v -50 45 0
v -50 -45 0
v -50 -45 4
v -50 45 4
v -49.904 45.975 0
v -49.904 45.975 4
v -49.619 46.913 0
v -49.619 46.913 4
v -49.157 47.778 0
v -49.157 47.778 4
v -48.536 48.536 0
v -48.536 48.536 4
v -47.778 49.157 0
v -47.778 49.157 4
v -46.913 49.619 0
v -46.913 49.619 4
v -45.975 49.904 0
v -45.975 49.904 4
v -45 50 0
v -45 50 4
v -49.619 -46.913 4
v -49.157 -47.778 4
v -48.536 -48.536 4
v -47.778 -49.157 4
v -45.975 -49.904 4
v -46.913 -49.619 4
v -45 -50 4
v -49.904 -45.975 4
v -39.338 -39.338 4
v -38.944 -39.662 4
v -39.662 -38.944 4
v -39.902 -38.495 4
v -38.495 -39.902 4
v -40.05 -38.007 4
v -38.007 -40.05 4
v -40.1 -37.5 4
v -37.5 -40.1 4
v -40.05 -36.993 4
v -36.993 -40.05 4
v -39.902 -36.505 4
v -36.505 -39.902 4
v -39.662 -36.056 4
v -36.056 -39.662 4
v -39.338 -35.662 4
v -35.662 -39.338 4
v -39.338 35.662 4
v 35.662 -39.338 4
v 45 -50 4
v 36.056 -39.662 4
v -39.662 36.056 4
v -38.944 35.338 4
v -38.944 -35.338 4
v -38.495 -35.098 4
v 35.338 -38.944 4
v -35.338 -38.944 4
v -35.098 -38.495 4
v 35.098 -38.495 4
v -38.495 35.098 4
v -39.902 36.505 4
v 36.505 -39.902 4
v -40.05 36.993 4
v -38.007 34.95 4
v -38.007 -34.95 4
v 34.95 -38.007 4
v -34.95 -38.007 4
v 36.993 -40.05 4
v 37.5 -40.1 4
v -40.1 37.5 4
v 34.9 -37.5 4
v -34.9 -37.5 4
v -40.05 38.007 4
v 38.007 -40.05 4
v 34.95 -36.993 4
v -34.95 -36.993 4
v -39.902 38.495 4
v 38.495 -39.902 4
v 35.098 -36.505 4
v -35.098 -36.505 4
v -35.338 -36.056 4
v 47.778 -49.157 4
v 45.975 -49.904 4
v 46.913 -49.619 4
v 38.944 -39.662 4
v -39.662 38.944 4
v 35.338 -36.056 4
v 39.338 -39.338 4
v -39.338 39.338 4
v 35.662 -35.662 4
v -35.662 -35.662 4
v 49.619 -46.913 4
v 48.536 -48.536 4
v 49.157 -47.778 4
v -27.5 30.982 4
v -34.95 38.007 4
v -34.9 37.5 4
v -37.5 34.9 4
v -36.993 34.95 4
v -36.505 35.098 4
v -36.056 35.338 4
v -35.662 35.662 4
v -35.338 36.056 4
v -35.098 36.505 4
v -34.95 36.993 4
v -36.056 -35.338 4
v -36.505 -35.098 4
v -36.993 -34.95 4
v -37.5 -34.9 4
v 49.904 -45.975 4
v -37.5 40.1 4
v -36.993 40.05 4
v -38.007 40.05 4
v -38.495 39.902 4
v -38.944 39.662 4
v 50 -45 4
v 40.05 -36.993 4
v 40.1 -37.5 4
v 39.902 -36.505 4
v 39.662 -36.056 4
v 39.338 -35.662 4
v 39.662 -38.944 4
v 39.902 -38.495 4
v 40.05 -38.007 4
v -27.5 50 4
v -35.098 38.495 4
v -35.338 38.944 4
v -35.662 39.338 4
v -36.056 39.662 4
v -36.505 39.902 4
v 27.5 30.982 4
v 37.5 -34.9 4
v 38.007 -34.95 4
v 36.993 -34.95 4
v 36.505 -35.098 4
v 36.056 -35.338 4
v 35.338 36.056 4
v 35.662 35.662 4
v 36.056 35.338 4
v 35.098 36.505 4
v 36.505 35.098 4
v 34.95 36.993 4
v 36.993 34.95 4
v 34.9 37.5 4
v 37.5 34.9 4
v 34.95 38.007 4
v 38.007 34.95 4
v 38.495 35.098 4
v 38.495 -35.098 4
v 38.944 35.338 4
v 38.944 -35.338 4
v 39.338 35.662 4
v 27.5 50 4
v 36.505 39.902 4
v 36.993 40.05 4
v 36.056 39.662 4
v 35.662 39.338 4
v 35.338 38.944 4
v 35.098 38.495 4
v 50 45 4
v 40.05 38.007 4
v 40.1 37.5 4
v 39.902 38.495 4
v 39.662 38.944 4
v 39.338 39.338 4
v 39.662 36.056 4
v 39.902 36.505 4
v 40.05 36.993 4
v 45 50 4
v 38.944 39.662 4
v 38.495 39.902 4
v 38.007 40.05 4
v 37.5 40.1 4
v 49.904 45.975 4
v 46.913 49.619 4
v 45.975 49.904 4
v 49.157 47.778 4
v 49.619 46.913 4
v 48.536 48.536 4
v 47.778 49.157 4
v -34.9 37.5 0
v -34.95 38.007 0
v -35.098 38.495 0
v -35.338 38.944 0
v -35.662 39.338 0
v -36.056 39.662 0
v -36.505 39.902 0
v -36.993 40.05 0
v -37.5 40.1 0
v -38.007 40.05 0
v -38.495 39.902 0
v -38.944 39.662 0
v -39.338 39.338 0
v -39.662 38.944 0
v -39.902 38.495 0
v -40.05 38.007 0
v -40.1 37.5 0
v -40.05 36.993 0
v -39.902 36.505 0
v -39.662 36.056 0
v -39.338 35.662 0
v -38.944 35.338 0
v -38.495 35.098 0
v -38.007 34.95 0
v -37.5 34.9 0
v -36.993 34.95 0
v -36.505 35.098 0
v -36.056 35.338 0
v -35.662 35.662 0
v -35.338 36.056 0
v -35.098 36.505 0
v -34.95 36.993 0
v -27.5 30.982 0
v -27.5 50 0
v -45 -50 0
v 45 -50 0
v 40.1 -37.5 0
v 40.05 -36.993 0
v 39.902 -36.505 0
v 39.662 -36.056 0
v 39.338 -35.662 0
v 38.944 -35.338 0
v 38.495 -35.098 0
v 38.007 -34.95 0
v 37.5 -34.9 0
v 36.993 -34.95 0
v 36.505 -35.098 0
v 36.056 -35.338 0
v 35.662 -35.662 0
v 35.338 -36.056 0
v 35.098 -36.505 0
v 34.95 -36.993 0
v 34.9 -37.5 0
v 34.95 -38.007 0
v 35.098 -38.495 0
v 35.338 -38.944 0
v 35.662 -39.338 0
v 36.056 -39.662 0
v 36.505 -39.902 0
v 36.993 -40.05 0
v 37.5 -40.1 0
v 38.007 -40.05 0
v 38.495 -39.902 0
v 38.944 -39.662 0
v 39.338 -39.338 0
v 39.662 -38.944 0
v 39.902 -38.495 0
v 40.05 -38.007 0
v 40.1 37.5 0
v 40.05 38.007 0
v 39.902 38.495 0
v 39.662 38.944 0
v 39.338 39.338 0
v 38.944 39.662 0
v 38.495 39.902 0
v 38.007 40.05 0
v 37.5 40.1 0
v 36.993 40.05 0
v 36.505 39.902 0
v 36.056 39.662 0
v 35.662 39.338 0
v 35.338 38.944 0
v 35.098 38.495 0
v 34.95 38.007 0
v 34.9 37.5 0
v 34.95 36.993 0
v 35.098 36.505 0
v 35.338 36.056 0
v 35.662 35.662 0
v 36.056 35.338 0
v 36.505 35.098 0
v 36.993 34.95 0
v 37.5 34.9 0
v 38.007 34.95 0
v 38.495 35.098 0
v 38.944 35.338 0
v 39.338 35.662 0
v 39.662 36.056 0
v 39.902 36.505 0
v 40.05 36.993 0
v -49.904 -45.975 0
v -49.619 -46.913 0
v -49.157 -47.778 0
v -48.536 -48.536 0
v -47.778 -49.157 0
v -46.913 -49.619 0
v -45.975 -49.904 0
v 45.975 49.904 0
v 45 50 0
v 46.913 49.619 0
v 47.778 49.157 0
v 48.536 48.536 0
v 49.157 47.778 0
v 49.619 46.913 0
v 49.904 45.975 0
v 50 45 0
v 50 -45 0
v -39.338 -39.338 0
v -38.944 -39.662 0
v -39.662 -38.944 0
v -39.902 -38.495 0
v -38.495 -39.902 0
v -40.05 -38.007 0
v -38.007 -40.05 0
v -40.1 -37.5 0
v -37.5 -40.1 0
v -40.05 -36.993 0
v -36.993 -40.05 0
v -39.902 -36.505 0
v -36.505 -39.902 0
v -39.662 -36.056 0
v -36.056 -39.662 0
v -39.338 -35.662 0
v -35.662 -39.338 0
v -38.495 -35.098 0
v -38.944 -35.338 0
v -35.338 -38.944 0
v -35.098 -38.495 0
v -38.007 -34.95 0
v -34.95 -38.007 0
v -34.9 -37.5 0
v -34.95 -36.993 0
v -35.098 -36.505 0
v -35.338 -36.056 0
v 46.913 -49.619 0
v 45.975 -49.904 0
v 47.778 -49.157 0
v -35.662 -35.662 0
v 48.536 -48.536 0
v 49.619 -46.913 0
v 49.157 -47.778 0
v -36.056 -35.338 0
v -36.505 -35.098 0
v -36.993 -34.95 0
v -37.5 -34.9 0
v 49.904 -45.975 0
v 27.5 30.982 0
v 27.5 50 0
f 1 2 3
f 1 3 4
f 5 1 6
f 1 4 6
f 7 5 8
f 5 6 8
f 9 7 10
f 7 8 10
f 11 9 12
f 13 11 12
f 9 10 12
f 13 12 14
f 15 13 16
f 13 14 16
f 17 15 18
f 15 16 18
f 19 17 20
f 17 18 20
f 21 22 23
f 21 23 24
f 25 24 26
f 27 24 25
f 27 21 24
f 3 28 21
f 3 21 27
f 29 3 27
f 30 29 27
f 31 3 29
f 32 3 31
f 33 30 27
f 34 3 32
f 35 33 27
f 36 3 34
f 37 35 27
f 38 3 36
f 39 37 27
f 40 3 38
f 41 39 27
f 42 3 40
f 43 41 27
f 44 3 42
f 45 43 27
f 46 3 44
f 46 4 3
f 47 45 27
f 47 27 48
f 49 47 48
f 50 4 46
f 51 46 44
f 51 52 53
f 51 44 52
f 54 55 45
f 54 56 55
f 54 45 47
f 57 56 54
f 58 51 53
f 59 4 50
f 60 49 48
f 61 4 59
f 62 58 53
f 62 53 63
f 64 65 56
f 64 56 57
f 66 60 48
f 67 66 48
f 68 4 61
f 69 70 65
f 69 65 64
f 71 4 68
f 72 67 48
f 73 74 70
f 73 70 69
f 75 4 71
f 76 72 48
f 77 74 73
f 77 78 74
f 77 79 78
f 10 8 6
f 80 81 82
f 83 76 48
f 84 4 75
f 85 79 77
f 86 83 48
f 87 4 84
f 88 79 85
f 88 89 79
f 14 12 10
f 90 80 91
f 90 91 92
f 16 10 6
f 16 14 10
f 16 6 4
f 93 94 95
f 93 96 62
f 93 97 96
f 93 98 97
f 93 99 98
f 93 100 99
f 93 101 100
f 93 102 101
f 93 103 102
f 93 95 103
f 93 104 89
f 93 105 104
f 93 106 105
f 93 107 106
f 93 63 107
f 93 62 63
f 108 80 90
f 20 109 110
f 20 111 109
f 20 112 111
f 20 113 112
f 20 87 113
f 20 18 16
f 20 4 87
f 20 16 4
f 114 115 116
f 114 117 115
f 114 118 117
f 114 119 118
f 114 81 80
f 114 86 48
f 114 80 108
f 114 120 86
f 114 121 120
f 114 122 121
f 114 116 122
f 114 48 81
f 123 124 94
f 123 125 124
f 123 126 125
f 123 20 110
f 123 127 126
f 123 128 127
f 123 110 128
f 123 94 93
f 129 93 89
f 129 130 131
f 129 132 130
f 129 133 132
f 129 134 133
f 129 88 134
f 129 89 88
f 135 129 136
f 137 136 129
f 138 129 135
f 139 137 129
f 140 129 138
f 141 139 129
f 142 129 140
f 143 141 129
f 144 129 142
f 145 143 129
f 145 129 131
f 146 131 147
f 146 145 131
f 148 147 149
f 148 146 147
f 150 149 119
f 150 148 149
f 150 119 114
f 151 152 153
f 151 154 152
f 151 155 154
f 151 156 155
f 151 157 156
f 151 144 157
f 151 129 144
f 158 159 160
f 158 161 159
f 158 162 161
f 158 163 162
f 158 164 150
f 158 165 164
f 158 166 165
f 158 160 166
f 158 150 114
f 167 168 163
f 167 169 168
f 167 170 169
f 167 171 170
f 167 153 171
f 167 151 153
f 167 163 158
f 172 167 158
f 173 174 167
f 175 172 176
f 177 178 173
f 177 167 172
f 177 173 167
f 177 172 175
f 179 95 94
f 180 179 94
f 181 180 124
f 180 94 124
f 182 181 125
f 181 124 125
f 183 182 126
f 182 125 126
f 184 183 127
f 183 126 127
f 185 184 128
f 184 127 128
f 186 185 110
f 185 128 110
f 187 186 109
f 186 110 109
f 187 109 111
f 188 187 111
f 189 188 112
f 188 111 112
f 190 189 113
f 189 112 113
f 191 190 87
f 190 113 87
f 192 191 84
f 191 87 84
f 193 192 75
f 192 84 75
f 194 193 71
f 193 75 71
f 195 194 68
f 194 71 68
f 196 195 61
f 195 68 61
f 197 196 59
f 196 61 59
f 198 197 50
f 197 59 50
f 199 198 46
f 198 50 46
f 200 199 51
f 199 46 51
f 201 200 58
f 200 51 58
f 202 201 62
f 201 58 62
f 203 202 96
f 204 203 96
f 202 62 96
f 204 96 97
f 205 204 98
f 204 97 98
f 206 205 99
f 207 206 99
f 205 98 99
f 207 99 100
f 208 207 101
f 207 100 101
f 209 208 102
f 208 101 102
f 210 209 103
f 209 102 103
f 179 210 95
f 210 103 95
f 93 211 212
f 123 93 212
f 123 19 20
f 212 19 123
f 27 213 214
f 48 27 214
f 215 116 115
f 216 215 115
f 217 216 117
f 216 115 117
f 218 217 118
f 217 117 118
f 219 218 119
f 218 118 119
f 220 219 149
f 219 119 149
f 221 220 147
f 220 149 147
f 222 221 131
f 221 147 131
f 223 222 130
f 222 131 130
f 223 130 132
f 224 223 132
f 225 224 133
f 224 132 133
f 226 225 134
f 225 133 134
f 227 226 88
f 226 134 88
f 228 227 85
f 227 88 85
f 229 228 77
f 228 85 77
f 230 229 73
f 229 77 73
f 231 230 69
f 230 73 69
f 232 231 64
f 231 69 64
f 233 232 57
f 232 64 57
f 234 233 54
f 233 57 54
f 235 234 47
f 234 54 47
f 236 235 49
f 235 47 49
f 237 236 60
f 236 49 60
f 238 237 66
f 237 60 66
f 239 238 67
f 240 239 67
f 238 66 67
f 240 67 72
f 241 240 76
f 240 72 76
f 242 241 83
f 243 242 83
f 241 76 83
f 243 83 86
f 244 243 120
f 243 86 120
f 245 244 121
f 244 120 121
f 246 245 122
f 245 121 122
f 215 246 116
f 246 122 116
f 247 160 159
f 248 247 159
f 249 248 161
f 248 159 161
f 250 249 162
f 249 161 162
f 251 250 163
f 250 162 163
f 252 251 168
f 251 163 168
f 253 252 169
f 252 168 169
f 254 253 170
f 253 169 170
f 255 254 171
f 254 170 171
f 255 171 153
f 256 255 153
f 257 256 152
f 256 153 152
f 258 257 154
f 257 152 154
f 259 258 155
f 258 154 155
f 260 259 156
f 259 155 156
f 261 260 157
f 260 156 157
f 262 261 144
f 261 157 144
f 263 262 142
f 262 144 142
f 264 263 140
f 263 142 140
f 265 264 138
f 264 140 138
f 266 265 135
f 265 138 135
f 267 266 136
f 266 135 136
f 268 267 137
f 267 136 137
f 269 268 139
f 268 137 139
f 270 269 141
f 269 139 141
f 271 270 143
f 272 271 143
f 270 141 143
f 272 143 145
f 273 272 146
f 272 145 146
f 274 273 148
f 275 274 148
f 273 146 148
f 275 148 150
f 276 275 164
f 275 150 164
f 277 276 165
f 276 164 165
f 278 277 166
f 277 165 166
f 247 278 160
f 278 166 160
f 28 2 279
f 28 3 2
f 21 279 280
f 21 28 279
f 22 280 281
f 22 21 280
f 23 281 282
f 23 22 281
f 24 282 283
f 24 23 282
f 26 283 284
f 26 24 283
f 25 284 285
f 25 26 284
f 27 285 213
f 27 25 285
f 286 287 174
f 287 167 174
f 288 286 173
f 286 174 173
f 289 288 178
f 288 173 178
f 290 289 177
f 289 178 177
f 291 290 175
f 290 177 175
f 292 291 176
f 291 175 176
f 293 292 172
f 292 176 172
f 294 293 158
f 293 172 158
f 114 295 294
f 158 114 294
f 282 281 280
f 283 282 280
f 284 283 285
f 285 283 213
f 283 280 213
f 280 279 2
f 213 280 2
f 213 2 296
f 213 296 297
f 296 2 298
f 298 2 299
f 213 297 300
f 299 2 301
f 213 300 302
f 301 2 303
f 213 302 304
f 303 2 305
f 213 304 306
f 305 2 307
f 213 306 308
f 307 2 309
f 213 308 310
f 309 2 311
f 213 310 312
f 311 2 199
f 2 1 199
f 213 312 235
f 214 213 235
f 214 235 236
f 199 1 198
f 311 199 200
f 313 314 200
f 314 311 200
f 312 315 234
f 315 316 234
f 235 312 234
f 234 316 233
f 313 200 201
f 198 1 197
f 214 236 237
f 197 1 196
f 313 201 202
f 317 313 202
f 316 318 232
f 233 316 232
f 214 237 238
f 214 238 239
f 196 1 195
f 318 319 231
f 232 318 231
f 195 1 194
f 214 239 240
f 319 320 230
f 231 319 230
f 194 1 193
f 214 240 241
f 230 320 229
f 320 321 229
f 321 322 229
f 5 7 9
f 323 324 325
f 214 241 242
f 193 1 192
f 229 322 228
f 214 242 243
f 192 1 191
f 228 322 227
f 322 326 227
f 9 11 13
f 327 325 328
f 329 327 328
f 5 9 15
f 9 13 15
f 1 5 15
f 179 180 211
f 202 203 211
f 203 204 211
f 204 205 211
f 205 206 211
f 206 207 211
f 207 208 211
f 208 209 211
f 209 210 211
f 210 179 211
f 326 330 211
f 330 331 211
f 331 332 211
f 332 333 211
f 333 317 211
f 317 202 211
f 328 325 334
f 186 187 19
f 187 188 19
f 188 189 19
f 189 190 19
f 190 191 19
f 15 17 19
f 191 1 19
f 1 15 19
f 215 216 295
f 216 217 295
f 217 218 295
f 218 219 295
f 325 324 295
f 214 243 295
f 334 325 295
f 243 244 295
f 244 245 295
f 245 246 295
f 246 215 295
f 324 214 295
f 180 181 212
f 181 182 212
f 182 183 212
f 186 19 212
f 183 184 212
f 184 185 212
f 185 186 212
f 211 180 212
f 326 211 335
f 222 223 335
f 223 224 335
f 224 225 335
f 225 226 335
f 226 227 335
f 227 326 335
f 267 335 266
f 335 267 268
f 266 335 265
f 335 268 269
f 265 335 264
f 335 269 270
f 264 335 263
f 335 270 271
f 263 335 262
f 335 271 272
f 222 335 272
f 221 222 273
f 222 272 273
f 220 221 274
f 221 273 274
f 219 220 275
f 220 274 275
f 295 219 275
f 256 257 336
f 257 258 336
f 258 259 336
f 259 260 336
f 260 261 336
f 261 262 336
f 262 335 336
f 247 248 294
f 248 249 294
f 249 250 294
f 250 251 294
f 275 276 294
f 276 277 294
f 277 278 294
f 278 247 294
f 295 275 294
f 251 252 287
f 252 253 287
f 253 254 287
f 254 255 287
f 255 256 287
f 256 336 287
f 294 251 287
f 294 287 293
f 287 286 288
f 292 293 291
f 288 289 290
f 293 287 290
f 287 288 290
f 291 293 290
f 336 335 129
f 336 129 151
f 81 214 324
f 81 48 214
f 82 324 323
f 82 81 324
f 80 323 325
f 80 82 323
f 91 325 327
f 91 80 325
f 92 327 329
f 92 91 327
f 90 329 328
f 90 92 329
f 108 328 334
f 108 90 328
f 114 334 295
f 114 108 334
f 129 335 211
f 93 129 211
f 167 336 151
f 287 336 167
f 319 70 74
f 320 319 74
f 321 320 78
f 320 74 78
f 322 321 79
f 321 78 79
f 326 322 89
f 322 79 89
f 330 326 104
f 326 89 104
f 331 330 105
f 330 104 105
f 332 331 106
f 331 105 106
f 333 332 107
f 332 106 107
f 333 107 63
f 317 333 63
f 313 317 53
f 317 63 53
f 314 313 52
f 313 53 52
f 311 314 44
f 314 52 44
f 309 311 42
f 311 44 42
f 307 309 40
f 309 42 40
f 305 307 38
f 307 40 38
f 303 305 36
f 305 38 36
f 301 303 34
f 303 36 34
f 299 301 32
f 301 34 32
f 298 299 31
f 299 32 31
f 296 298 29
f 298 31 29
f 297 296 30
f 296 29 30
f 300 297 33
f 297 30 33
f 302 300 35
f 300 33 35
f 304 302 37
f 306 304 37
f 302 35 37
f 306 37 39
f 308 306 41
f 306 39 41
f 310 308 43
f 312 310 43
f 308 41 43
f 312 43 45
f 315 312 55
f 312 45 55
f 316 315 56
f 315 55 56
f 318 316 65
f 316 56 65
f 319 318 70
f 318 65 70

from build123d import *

# Parameters (mm, degrees)
SKETCH1_W           = 100
SKETCH1_H           = 100
BOSS_EXTRUDE1_DEPTH = 4
SKETCH2_R           = 2.6
CUT_EXTRUDE1_DEPTH  = 4
FILLET1_R           = 5
SKETCH3_W           = 55
SKETCH3_H           = 25
CUT_EXTRUDE2_DEPTH  = 4


with BuildPart() as part:
    # Sketch1 → Boss-Extrude1 (new body)
    with BuildSketch(Plane.XY):
        Rectangle(SKETCH1_W, SKETCH1_H)
    extrude(amount=BOSS_EXTRUDE1_DEPTH)

    # Sketch2 → Cut-Extrude1 (cut)
    with BuildSketch(Plane.XY.offset(4)):
        with Locations((-37.5, 37.5)):
            Circle(SKETCH2_R)
        with Locations((-37.5, -37.5)):
            Circle(SKETCH2_R)
        with Locations((37.5, -37.5)):
            Circle(SKETCH2_R)
        with Locations((37.5, 37.5)):
            Circle(SKETCH2_R)
    extrude(amount=-CUT_EXTRUDE1_DEPTH, mode=Mode.SUBTRACT)

    # Fillet1
    fillet1_edges = [part.edges().sort_by_distance(p)[0] for p in [
        (-50, 50, 2),
        (50, 50, 2),
        (50, -50, 2),
        (-50, -50, 2),
    ]]
    fillet(fillet1_edges, radius=FILLET1_R)

    # Sketch3 → Cut-Extrude2 (cut)
    with BuildSketch(Plane(origin=(0, 0, 0), x_dir=(-1, 0, 0), z_dir=(0, 0, -1))):
        with Locations((0, 43.482027076)):
            Rectangle(SKETCH3_W, SKETCH3_H)
    extrude(amount=-CUT_EXTRUDE2_DEPTH, mode=Mode.SUBTRACT)


solid = part.part
